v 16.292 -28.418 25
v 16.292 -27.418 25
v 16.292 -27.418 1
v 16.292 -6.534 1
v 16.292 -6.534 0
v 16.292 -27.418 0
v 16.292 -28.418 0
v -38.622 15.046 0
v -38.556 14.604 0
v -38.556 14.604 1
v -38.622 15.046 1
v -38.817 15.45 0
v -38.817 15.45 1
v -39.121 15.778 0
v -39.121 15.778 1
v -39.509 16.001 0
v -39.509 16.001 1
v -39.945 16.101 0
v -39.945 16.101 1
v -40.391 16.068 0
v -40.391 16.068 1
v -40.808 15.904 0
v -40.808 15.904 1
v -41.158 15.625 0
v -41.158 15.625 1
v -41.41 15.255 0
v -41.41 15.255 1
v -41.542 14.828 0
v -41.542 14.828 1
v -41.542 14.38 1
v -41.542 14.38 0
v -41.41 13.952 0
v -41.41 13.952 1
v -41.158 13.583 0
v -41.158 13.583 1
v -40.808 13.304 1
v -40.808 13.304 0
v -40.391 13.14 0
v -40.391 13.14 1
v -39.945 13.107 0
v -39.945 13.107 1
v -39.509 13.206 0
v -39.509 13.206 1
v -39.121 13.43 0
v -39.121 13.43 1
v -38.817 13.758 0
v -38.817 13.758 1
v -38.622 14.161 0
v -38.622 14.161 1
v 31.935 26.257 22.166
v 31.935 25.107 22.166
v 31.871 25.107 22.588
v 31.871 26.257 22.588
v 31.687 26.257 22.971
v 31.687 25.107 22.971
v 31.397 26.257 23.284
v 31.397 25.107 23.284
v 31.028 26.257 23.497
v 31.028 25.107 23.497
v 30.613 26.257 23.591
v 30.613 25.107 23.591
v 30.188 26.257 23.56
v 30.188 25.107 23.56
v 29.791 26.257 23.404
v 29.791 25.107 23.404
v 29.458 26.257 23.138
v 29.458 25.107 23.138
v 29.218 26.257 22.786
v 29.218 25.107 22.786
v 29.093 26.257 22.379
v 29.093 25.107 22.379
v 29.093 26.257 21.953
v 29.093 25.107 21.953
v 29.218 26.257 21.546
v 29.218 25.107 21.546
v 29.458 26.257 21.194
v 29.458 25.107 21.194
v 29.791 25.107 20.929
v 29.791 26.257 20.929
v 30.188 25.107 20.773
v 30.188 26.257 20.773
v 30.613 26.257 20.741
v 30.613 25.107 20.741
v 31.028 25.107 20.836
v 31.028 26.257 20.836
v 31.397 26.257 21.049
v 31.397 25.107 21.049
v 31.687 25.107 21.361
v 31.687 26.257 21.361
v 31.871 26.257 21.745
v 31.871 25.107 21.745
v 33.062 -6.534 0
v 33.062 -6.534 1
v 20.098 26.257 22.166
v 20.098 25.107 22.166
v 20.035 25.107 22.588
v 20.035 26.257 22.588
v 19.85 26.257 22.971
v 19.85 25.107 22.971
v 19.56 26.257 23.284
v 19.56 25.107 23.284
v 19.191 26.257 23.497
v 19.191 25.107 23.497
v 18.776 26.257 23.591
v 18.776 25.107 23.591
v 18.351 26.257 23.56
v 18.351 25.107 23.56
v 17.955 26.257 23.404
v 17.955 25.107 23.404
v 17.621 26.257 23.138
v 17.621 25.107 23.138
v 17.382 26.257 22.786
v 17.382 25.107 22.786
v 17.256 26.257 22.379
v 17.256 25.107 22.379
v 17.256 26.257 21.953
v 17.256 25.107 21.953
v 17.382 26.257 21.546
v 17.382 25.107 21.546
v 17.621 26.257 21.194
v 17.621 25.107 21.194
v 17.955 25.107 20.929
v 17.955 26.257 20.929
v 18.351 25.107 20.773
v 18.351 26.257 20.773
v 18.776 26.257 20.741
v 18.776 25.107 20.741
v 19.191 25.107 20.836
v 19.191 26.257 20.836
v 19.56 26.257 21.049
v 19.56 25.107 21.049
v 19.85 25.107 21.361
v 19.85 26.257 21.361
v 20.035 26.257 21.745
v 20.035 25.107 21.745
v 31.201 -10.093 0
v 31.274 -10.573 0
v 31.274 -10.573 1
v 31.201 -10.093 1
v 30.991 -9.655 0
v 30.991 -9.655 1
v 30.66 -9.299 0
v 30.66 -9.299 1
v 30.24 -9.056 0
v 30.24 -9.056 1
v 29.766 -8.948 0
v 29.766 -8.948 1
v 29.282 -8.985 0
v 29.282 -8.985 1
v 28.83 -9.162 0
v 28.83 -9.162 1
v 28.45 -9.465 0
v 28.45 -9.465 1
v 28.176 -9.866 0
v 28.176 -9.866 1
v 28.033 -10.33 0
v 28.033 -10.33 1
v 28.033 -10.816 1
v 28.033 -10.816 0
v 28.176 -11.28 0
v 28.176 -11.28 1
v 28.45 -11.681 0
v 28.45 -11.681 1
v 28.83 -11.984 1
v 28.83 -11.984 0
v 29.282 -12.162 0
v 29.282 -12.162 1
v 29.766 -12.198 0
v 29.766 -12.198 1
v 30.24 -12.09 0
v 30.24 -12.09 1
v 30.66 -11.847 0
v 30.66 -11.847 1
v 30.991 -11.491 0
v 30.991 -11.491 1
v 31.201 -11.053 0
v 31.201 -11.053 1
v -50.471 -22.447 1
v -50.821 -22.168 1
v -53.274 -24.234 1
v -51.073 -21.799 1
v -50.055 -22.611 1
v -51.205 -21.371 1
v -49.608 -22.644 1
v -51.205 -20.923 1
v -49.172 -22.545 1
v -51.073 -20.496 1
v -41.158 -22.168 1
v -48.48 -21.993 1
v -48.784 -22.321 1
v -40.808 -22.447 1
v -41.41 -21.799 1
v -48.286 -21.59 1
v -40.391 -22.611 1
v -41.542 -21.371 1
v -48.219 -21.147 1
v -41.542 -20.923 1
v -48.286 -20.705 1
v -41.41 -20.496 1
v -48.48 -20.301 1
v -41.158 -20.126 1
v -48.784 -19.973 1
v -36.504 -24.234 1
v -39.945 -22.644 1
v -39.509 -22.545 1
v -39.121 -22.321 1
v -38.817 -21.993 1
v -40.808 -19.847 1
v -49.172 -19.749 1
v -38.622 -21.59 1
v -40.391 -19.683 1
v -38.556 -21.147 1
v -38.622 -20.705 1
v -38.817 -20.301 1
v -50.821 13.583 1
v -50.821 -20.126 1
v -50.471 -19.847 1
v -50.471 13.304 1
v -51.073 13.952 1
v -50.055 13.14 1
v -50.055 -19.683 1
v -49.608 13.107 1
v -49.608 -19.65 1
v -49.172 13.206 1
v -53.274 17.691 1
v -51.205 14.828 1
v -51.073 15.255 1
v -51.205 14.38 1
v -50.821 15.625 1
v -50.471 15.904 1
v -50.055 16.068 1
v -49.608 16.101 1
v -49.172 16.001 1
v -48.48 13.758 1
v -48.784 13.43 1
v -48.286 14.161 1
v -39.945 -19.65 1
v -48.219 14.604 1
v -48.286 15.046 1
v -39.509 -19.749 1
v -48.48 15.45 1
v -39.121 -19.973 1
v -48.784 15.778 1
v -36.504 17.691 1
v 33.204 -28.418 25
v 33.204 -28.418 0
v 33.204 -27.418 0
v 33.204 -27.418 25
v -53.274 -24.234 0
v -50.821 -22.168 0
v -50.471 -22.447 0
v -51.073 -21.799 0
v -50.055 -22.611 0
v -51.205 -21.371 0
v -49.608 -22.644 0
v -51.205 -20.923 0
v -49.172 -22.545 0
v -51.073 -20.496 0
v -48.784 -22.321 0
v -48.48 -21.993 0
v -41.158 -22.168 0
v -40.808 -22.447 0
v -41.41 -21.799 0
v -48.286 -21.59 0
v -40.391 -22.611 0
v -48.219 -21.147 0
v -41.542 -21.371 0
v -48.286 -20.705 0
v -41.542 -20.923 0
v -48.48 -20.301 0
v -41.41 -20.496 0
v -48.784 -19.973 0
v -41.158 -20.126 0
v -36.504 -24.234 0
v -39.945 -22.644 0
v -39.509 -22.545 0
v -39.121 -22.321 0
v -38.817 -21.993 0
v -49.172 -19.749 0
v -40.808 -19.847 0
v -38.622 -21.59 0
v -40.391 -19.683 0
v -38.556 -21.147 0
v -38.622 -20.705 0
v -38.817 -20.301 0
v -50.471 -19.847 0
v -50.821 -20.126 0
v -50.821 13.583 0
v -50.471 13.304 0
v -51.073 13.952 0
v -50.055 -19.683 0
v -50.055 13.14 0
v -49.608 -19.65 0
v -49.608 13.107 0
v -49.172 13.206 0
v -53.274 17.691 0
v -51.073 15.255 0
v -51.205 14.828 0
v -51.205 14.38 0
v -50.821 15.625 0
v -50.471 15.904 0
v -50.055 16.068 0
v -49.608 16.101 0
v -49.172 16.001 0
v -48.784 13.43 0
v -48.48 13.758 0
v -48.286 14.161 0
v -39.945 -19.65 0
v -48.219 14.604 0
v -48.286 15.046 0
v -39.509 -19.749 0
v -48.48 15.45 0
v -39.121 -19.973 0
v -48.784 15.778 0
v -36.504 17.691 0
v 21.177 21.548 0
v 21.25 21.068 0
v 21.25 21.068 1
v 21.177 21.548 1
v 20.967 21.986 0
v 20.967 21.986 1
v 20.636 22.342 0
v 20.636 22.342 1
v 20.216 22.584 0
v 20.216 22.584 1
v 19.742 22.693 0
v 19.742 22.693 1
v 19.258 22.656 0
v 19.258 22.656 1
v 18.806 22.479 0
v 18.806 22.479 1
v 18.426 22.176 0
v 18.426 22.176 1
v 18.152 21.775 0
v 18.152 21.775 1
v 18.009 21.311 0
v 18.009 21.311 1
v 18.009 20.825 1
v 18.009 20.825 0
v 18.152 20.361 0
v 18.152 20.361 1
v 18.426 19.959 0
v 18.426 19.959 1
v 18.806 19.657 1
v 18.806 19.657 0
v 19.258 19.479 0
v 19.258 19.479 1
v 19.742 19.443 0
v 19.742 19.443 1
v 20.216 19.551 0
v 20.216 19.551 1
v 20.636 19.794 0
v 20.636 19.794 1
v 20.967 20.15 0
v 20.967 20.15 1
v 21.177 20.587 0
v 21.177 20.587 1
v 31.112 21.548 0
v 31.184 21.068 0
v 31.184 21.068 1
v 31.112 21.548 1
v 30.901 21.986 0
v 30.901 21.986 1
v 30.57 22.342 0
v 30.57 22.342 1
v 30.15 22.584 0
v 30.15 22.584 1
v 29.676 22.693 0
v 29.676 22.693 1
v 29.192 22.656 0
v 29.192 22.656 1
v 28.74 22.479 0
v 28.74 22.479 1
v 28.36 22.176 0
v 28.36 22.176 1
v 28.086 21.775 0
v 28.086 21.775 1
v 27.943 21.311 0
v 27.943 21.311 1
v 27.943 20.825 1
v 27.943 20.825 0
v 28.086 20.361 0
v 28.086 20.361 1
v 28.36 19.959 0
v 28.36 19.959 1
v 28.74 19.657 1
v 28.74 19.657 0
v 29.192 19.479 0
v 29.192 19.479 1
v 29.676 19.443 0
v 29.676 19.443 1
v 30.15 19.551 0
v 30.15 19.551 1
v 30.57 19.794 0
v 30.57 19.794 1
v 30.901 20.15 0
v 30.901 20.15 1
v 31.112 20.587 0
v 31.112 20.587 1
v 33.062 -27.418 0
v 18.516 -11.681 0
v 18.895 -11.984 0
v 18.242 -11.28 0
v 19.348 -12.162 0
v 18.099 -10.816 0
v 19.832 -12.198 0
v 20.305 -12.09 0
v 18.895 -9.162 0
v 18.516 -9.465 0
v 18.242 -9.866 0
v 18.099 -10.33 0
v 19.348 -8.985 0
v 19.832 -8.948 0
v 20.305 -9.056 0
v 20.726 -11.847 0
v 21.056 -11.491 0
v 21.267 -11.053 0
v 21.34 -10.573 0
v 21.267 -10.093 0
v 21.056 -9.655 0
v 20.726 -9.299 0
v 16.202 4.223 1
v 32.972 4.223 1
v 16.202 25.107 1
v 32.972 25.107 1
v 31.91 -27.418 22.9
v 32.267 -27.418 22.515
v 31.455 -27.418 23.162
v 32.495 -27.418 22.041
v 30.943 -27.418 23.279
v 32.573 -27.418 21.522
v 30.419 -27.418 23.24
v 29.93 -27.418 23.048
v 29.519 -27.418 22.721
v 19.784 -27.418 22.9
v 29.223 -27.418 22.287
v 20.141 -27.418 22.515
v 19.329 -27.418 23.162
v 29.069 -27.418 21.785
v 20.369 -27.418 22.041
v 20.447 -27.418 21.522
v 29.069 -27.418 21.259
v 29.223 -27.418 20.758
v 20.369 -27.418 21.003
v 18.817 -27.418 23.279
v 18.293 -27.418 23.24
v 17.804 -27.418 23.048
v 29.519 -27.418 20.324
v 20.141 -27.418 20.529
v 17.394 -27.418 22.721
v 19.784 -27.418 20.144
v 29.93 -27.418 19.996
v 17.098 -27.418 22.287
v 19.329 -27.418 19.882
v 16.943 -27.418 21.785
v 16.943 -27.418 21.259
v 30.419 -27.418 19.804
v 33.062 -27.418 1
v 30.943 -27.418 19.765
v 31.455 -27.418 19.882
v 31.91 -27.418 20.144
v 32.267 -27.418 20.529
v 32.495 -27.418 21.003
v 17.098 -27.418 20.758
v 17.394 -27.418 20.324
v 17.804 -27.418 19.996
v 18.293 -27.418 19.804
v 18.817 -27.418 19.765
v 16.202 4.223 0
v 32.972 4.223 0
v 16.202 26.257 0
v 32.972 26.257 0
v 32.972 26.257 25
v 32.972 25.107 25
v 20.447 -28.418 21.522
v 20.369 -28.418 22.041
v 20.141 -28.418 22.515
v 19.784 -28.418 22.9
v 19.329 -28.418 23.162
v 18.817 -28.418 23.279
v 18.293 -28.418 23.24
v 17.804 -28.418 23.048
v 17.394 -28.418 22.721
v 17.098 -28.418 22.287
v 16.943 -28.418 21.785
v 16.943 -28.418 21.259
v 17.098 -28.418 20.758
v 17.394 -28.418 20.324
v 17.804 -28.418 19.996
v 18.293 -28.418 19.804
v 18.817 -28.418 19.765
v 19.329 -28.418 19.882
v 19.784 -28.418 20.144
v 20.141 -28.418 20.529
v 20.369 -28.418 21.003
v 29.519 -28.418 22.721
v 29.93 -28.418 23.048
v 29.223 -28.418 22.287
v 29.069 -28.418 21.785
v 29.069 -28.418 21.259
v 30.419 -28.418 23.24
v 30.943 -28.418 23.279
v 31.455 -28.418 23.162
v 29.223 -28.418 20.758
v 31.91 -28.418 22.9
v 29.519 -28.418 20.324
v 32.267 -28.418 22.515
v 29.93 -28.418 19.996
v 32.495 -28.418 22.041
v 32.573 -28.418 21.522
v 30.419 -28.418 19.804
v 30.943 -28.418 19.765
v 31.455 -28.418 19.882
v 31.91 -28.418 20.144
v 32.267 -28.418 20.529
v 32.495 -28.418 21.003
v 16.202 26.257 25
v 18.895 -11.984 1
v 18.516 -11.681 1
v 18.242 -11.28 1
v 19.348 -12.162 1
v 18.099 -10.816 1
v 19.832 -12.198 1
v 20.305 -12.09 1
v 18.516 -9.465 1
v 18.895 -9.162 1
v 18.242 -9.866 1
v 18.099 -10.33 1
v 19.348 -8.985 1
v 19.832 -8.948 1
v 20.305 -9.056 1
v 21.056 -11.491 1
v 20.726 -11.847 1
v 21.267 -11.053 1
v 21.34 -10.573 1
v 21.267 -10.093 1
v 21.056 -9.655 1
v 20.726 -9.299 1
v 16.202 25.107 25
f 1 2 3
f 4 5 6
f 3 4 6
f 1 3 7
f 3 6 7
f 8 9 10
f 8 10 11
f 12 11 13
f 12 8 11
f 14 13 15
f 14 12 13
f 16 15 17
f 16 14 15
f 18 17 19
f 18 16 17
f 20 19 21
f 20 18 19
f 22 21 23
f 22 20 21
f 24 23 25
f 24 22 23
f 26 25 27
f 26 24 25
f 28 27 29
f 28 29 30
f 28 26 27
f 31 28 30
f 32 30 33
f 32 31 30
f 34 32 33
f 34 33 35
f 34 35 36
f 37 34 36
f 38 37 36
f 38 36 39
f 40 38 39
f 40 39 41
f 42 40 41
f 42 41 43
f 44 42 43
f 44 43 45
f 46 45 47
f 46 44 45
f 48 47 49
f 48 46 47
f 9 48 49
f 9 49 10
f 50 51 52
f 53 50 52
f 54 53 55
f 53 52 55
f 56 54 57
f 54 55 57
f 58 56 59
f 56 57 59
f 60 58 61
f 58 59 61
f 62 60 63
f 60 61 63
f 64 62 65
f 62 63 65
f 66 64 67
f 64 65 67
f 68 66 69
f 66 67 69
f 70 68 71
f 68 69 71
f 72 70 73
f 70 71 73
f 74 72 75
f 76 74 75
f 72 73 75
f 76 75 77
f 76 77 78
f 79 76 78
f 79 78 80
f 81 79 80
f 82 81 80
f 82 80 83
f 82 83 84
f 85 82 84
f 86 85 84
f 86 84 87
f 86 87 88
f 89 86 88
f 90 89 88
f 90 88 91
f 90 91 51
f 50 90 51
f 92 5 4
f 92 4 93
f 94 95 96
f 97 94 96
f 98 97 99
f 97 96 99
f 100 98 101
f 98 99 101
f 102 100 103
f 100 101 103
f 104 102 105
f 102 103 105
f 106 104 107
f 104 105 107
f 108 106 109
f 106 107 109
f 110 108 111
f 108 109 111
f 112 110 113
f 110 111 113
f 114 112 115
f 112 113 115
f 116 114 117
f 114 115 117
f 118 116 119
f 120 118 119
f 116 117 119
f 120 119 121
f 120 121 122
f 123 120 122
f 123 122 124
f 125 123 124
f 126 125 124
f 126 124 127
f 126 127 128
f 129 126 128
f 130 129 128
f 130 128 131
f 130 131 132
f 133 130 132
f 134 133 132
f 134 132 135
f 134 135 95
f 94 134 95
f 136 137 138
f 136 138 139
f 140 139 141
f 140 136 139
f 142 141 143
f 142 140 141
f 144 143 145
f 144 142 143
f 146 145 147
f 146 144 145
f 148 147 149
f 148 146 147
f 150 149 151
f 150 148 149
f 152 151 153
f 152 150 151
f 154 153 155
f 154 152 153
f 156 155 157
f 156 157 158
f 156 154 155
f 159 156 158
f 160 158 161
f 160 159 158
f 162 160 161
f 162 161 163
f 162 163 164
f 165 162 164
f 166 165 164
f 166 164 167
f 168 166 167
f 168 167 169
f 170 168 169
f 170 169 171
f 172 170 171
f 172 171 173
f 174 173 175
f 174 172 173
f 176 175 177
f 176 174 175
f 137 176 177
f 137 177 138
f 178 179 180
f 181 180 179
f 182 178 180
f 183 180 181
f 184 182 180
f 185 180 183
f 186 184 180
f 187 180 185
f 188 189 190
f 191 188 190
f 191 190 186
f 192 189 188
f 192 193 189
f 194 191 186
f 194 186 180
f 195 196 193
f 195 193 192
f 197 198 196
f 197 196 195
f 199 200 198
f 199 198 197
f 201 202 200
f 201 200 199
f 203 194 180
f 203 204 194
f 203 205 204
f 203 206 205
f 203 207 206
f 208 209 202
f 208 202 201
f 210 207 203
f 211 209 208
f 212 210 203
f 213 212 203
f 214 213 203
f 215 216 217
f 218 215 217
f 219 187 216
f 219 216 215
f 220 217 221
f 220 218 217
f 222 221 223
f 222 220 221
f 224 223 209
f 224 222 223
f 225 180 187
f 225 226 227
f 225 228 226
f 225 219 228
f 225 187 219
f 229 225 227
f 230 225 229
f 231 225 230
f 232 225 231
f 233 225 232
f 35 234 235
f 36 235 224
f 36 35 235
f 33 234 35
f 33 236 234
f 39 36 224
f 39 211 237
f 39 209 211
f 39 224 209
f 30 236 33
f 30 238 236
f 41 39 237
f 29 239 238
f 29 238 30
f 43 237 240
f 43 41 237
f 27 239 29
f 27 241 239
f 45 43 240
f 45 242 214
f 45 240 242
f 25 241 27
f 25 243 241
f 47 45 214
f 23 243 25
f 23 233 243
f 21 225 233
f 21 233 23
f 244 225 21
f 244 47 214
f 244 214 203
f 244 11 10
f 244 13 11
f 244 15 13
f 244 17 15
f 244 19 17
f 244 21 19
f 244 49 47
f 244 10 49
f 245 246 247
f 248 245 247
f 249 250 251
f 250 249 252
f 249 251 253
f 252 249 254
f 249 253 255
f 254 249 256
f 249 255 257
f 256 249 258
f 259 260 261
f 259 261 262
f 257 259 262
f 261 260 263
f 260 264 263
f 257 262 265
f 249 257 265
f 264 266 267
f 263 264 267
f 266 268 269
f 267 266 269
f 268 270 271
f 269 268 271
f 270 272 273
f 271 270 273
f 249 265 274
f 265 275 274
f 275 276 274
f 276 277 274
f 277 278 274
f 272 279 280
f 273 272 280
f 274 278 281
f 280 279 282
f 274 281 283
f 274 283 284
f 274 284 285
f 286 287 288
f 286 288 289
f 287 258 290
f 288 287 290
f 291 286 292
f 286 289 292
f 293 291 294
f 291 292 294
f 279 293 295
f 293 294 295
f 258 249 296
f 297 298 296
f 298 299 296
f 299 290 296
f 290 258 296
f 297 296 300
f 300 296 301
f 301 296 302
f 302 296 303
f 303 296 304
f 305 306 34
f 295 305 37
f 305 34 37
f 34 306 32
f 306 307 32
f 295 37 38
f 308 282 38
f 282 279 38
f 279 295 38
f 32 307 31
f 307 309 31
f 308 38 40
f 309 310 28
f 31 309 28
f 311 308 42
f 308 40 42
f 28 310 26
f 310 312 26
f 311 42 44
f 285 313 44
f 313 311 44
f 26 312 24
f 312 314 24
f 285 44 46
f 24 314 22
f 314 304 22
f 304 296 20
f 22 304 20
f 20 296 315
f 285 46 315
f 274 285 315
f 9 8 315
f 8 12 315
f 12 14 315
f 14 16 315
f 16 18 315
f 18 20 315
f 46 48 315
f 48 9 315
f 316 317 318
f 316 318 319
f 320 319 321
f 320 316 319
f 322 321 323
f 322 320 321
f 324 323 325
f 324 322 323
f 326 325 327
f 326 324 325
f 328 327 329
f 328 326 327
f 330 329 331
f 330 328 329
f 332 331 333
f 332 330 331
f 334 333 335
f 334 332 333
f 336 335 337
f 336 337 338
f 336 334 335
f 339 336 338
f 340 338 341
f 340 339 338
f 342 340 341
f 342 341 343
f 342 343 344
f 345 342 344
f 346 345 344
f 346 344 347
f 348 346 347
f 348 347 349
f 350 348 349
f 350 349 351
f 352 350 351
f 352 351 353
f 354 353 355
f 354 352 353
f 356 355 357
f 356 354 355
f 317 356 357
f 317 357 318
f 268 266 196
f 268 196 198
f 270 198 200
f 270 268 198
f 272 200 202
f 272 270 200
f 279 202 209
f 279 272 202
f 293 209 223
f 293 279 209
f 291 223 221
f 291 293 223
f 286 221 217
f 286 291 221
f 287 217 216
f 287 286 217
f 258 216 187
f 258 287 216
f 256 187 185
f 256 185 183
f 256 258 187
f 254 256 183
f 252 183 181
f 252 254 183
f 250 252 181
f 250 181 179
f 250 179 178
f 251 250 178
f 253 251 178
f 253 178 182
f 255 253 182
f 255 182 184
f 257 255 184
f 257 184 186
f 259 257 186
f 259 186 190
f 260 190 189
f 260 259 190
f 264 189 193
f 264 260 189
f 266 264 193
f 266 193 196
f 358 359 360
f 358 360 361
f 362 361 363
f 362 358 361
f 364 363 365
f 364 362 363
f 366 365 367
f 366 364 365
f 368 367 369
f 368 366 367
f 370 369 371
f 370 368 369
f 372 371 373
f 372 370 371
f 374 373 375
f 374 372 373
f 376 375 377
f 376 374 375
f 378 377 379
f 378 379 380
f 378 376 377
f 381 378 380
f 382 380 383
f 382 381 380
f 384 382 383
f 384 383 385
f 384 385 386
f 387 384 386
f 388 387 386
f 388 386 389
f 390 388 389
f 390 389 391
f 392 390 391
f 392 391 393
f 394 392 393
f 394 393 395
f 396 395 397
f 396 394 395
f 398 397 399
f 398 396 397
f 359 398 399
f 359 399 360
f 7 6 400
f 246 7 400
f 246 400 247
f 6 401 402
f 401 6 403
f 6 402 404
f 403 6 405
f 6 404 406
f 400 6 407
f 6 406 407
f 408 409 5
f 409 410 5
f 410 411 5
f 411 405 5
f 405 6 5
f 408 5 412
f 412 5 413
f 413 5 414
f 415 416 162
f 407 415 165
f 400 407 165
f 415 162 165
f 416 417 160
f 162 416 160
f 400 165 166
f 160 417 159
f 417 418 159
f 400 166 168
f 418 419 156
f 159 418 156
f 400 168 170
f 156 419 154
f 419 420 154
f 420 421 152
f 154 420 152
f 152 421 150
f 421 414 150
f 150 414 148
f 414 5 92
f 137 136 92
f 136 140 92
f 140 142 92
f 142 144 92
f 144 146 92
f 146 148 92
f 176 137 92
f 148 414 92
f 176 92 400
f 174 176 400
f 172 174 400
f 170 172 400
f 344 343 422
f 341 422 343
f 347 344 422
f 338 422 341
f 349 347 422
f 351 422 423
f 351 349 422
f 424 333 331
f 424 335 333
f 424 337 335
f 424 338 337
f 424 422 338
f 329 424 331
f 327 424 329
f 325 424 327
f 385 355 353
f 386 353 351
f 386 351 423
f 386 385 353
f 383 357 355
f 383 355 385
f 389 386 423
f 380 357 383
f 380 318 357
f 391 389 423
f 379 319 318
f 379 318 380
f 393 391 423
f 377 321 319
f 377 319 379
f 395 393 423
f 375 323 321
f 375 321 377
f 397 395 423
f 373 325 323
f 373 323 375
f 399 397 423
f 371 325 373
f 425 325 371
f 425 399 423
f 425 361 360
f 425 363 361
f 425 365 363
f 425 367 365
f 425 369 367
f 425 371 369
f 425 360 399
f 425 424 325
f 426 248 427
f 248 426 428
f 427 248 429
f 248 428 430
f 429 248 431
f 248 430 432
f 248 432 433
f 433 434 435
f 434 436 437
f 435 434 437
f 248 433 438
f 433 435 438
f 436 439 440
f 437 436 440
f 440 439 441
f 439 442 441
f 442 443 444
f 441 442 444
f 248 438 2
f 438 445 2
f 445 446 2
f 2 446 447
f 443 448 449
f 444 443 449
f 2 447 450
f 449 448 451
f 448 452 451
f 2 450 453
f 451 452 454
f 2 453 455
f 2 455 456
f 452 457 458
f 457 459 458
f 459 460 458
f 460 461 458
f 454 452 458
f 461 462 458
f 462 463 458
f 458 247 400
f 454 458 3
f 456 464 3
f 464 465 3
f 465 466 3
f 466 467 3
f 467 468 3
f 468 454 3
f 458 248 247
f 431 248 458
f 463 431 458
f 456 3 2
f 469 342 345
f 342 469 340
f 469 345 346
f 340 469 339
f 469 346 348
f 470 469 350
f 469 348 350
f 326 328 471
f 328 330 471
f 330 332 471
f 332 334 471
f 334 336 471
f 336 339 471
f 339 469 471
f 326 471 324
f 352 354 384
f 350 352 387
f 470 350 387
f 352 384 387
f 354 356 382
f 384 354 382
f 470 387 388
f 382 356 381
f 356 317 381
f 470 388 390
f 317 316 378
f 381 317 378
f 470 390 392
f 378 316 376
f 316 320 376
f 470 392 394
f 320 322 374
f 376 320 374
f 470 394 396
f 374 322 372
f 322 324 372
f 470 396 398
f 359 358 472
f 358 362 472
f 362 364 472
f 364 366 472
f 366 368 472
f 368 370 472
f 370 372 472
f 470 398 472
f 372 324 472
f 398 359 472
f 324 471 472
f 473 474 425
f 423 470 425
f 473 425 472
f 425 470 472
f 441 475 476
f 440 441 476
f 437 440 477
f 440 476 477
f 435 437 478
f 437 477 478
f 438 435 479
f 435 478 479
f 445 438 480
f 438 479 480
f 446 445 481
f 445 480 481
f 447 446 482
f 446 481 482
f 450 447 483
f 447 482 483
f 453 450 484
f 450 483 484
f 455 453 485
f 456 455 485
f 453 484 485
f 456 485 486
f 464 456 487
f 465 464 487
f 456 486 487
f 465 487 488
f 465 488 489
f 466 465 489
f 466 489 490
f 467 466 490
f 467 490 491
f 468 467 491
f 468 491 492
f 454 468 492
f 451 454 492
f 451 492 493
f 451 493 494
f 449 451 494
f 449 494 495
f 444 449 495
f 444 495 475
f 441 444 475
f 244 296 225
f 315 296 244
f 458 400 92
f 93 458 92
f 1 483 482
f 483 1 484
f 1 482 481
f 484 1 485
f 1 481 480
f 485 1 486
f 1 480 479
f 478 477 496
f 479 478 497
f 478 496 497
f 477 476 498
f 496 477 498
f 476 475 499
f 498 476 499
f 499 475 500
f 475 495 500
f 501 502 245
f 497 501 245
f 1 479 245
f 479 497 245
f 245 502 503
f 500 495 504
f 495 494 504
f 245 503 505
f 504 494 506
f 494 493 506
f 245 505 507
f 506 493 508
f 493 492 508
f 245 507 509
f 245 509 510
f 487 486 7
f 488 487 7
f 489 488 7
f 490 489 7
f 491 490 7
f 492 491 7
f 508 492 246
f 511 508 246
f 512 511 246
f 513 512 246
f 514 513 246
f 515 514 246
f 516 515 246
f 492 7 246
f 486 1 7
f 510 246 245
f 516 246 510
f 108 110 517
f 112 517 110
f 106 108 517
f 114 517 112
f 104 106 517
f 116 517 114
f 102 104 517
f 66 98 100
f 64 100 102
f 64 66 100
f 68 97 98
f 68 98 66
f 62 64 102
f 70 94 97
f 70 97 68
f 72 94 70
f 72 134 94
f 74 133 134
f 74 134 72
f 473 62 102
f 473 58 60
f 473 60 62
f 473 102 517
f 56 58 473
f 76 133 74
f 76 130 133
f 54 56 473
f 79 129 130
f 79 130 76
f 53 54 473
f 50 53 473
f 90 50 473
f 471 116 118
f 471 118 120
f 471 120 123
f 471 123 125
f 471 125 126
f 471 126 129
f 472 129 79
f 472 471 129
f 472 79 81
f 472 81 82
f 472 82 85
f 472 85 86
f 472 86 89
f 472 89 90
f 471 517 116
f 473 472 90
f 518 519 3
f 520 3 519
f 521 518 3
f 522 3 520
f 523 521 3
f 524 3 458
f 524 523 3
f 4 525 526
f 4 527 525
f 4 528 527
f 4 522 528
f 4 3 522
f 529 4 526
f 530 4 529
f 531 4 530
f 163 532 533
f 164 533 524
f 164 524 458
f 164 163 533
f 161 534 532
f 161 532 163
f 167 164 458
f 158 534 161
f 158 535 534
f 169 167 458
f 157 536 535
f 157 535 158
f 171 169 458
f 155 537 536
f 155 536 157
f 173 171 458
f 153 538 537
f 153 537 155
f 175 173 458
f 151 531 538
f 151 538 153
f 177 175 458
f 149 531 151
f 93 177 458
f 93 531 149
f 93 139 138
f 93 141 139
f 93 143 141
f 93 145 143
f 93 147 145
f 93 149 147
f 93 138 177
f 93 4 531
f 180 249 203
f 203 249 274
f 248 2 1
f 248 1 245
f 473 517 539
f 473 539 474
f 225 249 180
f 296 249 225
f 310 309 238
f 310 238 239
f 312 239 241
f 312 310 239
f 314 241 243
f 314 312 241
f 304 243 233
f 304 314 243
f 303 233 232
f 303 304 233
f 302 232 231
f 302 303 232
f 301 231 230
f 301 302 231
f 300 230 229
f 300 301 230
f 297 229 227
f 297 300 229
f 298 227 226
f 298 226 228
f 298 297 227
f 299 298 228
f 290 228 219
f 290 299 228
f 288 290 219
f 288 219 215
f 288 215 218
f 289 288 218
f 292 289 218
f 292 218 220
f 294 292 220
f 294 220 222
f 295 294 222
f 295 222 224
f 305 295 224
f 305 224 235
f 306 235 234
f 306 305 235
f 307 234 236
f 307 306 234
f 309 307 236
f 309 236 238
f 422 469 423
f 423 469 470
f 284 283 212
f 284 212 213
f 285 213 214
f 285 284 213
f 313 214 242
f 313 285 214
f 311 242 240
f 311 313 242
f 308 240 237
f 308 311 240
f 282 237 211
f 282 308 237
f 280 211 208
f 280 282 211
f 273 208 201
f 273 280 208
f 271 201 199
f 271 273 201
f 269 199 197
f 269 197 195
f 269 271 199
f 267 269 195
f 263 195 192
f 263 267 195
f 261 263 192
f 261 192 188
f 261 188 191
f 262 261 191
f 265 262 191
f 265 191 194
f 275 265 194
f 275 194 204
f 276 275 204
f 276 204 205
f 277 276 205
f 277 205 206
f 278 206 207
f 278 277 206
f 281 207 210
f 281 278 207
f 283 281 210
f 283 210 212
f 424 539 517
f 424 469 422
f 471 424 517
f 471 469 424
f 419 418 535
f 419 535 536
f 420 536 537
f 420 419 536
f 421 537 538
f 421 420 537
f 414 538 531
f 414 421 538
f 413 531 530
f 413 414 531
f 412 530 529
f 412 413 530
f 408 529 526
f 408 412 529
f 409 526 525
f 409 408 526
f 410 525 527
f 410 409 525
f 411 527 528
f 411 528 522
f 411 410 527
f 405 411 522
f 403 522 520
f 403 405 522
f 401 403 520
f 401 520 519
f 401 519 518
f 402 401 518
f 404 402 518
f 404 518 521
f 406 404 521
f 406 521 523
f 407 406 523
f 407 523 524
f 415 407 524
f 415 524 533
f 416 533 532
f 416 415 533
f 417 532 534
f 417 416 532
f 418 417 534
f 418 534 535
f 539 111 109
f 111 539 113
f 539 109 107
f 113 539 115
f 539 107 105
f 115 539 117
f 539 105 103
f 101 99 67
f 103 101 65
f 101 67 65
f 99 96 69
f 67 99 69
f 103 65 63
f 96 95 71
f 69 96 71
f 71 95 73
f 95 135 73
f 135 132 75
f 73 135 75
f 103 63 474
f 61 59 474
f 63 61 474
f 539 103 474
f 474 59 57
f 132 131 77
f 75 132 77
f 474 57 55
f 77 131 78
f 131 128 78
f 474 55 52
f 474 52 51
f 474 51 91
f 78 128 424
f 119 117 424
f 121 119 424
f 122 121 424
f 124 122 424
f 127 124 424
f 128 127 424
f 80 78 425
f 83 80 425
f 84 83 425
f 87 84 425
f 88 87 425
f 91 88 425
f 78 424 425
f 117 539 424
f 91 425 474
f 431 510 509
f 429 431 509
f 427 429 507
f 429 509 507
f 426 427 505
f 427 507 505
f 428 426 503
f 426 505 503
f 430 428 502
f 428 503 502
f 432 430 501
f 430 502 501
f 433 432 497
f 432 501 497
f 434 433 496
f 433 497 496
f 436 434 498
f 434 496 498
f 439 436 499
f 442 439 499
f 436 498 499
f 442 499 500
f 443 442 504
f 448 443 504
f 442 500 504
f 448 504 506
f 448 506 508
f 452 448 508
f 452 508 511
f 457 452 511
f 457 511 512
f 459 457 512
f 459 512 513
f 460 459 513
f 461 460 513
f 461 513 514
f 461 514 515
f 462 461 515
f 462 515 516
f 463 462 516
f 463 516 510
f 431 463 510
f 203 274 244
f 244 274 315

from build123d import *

# Parameters (mm, degrees)
F0_W      = 16.7699885189
F0_H      = 20.8835028134
F0_R      = 1.6294197229
F1_DEPTH  = 1
F0_H_2    = 1.1498763046
F2_DEPTH  = 25
F0_H_3    = 41.9249712973
F0_R_2    = 1.5014178721
F3_DEPTH  = 1
F4_R      = 1.3832178235
F5_DEPTH  = 25
F6_DEPTH  = 1
F7_DEPTH  = 25
F8_R      = 1.7620519939
F9_DEPTH  = 25
F10_R     = 1.4290191918
F11_DEPTH = 25


with BuildPart() as f1:
    # F0 (on Top) → F1 (new body)
    with BuildSketch(Plane.XY):
        with Locations((24.5874928228, 14.6649249665)):
            Rectangle(F0_W, F0_H)
        with Locations((19.6204601819, 21.0676781434)):
            Circle(F0_R, mode=Mode.SUBTRACT)
        with Locations((29.5545254636, 21.0676781434)):
            Circle(F0_R, mode=Mode.SUBTRACT)
    extrude(amount=F1_DEPTH)

    # F0 (on Top) → F2 (join)
    with BuildSketch(Plane.XY):
        with Locations((24.5874928228, 25.6816145255)):
            Rectangle(F0_W, F0_H_2)
    extrude(amount=F2_DEPTH)

    # F4 (on face) → F5 (cut)
    with BuildSketch(Plane(origin=(0, 26.2565526778, 0), x_dir=(-1, 0, 0), z_dir=(0, 1, 0))):
        with Locations((-38.5302771582, 21.377472207)):
            Circle(F4_R)
        with Locations((-10.6447084873, 21.377472207)):
            Circle(F4_R)
    extrude(amount=-F5_DEPTH, mode=Mode.SUBTRACT)

    # F10 (on face) → F11 (cut)
    with BuildSketch(Plane.XZ.offset(-25.1066763732)):
        with Locations((18.6690278351, 22.1664067358)):
            Circle(F10_R)
        with Locations((30.5059578104, 22.1664067358)):
            Circle(F10_R)
    extrude(amount=-F11_DEPTH, mode=Mode.SUBTRACT)


with BuildPart() as f3:
    # F0 (on Top) → F3 (new body)
    with BuildSketch(Plane.XY):
        with Locations((-44.8888061203, -3.2716257687)):
            Rectangle(F0_W, F0_H_3)
        with Locations((-49.7204492679, -21.1470608453)):
            Circle(F0_R_2, mode=Mode.SUBTRACT)
        with Locations((-40.0571629727, -21.1470608453)):
            Circle(F0_R_2, mode=Mode.SUBTRACT)
        with Locations((-49.7204492679, 14.603809308)):
            Circle(F0_R_2, mode=Mode.SUBTRACT)
        with Locations((-40.0571629727, 14.603809308)):
            Circle(F0_R_2, mode=Mode.SUBTRACT)
    extrude(amount=F3_DEPTH)


with BuildPart() as f6:
    # F0 (on Top) → F6 (new body)
    with BuildSketch(Plane.XY):
        with Locations((24.6772297955, -16.9759181976)):
            Rectangle(F0_W, F0_H)
        with Locations((19.7101971547, -10.5731650206)):
            Circle(F0_R, mode=Mode.SUBTRACT)
        with Locations((29.6442624364, -10.5731650206)):
            Circle(F0_R, mode=Mode.SUBTRACT)
    extrude(amount=F6_DEPTH)

    # F0 (on Top) → F7 (join)
    with BuildSketch(Plane.XY):
        Polygon((33.062224055, -27.4176696043), (16.2922355361, -27.4176696043), (16.2922355361, -28.4176696043), (33.2041787669, -28.4176696043), (33.2041787669, -27.4176696043), align=None)
    extrude(amount=F7_DEPTH)

    # F8 (on face) → F9 (cut)
    with BuildSketch(Plane.XZ.offset(28.4176696043)):
        with Locations((18.6853874475, 21.5220544487)):
            Circle(F8_R)
        with Locations((30.8110268555, 21.5220544487)):
            Circle(F8_R)
    extrude(amount=-F9_DEPTH, mode=Mode.SUBTRACT)


solid = Compound([f1.part, f3.part, f6.part])
